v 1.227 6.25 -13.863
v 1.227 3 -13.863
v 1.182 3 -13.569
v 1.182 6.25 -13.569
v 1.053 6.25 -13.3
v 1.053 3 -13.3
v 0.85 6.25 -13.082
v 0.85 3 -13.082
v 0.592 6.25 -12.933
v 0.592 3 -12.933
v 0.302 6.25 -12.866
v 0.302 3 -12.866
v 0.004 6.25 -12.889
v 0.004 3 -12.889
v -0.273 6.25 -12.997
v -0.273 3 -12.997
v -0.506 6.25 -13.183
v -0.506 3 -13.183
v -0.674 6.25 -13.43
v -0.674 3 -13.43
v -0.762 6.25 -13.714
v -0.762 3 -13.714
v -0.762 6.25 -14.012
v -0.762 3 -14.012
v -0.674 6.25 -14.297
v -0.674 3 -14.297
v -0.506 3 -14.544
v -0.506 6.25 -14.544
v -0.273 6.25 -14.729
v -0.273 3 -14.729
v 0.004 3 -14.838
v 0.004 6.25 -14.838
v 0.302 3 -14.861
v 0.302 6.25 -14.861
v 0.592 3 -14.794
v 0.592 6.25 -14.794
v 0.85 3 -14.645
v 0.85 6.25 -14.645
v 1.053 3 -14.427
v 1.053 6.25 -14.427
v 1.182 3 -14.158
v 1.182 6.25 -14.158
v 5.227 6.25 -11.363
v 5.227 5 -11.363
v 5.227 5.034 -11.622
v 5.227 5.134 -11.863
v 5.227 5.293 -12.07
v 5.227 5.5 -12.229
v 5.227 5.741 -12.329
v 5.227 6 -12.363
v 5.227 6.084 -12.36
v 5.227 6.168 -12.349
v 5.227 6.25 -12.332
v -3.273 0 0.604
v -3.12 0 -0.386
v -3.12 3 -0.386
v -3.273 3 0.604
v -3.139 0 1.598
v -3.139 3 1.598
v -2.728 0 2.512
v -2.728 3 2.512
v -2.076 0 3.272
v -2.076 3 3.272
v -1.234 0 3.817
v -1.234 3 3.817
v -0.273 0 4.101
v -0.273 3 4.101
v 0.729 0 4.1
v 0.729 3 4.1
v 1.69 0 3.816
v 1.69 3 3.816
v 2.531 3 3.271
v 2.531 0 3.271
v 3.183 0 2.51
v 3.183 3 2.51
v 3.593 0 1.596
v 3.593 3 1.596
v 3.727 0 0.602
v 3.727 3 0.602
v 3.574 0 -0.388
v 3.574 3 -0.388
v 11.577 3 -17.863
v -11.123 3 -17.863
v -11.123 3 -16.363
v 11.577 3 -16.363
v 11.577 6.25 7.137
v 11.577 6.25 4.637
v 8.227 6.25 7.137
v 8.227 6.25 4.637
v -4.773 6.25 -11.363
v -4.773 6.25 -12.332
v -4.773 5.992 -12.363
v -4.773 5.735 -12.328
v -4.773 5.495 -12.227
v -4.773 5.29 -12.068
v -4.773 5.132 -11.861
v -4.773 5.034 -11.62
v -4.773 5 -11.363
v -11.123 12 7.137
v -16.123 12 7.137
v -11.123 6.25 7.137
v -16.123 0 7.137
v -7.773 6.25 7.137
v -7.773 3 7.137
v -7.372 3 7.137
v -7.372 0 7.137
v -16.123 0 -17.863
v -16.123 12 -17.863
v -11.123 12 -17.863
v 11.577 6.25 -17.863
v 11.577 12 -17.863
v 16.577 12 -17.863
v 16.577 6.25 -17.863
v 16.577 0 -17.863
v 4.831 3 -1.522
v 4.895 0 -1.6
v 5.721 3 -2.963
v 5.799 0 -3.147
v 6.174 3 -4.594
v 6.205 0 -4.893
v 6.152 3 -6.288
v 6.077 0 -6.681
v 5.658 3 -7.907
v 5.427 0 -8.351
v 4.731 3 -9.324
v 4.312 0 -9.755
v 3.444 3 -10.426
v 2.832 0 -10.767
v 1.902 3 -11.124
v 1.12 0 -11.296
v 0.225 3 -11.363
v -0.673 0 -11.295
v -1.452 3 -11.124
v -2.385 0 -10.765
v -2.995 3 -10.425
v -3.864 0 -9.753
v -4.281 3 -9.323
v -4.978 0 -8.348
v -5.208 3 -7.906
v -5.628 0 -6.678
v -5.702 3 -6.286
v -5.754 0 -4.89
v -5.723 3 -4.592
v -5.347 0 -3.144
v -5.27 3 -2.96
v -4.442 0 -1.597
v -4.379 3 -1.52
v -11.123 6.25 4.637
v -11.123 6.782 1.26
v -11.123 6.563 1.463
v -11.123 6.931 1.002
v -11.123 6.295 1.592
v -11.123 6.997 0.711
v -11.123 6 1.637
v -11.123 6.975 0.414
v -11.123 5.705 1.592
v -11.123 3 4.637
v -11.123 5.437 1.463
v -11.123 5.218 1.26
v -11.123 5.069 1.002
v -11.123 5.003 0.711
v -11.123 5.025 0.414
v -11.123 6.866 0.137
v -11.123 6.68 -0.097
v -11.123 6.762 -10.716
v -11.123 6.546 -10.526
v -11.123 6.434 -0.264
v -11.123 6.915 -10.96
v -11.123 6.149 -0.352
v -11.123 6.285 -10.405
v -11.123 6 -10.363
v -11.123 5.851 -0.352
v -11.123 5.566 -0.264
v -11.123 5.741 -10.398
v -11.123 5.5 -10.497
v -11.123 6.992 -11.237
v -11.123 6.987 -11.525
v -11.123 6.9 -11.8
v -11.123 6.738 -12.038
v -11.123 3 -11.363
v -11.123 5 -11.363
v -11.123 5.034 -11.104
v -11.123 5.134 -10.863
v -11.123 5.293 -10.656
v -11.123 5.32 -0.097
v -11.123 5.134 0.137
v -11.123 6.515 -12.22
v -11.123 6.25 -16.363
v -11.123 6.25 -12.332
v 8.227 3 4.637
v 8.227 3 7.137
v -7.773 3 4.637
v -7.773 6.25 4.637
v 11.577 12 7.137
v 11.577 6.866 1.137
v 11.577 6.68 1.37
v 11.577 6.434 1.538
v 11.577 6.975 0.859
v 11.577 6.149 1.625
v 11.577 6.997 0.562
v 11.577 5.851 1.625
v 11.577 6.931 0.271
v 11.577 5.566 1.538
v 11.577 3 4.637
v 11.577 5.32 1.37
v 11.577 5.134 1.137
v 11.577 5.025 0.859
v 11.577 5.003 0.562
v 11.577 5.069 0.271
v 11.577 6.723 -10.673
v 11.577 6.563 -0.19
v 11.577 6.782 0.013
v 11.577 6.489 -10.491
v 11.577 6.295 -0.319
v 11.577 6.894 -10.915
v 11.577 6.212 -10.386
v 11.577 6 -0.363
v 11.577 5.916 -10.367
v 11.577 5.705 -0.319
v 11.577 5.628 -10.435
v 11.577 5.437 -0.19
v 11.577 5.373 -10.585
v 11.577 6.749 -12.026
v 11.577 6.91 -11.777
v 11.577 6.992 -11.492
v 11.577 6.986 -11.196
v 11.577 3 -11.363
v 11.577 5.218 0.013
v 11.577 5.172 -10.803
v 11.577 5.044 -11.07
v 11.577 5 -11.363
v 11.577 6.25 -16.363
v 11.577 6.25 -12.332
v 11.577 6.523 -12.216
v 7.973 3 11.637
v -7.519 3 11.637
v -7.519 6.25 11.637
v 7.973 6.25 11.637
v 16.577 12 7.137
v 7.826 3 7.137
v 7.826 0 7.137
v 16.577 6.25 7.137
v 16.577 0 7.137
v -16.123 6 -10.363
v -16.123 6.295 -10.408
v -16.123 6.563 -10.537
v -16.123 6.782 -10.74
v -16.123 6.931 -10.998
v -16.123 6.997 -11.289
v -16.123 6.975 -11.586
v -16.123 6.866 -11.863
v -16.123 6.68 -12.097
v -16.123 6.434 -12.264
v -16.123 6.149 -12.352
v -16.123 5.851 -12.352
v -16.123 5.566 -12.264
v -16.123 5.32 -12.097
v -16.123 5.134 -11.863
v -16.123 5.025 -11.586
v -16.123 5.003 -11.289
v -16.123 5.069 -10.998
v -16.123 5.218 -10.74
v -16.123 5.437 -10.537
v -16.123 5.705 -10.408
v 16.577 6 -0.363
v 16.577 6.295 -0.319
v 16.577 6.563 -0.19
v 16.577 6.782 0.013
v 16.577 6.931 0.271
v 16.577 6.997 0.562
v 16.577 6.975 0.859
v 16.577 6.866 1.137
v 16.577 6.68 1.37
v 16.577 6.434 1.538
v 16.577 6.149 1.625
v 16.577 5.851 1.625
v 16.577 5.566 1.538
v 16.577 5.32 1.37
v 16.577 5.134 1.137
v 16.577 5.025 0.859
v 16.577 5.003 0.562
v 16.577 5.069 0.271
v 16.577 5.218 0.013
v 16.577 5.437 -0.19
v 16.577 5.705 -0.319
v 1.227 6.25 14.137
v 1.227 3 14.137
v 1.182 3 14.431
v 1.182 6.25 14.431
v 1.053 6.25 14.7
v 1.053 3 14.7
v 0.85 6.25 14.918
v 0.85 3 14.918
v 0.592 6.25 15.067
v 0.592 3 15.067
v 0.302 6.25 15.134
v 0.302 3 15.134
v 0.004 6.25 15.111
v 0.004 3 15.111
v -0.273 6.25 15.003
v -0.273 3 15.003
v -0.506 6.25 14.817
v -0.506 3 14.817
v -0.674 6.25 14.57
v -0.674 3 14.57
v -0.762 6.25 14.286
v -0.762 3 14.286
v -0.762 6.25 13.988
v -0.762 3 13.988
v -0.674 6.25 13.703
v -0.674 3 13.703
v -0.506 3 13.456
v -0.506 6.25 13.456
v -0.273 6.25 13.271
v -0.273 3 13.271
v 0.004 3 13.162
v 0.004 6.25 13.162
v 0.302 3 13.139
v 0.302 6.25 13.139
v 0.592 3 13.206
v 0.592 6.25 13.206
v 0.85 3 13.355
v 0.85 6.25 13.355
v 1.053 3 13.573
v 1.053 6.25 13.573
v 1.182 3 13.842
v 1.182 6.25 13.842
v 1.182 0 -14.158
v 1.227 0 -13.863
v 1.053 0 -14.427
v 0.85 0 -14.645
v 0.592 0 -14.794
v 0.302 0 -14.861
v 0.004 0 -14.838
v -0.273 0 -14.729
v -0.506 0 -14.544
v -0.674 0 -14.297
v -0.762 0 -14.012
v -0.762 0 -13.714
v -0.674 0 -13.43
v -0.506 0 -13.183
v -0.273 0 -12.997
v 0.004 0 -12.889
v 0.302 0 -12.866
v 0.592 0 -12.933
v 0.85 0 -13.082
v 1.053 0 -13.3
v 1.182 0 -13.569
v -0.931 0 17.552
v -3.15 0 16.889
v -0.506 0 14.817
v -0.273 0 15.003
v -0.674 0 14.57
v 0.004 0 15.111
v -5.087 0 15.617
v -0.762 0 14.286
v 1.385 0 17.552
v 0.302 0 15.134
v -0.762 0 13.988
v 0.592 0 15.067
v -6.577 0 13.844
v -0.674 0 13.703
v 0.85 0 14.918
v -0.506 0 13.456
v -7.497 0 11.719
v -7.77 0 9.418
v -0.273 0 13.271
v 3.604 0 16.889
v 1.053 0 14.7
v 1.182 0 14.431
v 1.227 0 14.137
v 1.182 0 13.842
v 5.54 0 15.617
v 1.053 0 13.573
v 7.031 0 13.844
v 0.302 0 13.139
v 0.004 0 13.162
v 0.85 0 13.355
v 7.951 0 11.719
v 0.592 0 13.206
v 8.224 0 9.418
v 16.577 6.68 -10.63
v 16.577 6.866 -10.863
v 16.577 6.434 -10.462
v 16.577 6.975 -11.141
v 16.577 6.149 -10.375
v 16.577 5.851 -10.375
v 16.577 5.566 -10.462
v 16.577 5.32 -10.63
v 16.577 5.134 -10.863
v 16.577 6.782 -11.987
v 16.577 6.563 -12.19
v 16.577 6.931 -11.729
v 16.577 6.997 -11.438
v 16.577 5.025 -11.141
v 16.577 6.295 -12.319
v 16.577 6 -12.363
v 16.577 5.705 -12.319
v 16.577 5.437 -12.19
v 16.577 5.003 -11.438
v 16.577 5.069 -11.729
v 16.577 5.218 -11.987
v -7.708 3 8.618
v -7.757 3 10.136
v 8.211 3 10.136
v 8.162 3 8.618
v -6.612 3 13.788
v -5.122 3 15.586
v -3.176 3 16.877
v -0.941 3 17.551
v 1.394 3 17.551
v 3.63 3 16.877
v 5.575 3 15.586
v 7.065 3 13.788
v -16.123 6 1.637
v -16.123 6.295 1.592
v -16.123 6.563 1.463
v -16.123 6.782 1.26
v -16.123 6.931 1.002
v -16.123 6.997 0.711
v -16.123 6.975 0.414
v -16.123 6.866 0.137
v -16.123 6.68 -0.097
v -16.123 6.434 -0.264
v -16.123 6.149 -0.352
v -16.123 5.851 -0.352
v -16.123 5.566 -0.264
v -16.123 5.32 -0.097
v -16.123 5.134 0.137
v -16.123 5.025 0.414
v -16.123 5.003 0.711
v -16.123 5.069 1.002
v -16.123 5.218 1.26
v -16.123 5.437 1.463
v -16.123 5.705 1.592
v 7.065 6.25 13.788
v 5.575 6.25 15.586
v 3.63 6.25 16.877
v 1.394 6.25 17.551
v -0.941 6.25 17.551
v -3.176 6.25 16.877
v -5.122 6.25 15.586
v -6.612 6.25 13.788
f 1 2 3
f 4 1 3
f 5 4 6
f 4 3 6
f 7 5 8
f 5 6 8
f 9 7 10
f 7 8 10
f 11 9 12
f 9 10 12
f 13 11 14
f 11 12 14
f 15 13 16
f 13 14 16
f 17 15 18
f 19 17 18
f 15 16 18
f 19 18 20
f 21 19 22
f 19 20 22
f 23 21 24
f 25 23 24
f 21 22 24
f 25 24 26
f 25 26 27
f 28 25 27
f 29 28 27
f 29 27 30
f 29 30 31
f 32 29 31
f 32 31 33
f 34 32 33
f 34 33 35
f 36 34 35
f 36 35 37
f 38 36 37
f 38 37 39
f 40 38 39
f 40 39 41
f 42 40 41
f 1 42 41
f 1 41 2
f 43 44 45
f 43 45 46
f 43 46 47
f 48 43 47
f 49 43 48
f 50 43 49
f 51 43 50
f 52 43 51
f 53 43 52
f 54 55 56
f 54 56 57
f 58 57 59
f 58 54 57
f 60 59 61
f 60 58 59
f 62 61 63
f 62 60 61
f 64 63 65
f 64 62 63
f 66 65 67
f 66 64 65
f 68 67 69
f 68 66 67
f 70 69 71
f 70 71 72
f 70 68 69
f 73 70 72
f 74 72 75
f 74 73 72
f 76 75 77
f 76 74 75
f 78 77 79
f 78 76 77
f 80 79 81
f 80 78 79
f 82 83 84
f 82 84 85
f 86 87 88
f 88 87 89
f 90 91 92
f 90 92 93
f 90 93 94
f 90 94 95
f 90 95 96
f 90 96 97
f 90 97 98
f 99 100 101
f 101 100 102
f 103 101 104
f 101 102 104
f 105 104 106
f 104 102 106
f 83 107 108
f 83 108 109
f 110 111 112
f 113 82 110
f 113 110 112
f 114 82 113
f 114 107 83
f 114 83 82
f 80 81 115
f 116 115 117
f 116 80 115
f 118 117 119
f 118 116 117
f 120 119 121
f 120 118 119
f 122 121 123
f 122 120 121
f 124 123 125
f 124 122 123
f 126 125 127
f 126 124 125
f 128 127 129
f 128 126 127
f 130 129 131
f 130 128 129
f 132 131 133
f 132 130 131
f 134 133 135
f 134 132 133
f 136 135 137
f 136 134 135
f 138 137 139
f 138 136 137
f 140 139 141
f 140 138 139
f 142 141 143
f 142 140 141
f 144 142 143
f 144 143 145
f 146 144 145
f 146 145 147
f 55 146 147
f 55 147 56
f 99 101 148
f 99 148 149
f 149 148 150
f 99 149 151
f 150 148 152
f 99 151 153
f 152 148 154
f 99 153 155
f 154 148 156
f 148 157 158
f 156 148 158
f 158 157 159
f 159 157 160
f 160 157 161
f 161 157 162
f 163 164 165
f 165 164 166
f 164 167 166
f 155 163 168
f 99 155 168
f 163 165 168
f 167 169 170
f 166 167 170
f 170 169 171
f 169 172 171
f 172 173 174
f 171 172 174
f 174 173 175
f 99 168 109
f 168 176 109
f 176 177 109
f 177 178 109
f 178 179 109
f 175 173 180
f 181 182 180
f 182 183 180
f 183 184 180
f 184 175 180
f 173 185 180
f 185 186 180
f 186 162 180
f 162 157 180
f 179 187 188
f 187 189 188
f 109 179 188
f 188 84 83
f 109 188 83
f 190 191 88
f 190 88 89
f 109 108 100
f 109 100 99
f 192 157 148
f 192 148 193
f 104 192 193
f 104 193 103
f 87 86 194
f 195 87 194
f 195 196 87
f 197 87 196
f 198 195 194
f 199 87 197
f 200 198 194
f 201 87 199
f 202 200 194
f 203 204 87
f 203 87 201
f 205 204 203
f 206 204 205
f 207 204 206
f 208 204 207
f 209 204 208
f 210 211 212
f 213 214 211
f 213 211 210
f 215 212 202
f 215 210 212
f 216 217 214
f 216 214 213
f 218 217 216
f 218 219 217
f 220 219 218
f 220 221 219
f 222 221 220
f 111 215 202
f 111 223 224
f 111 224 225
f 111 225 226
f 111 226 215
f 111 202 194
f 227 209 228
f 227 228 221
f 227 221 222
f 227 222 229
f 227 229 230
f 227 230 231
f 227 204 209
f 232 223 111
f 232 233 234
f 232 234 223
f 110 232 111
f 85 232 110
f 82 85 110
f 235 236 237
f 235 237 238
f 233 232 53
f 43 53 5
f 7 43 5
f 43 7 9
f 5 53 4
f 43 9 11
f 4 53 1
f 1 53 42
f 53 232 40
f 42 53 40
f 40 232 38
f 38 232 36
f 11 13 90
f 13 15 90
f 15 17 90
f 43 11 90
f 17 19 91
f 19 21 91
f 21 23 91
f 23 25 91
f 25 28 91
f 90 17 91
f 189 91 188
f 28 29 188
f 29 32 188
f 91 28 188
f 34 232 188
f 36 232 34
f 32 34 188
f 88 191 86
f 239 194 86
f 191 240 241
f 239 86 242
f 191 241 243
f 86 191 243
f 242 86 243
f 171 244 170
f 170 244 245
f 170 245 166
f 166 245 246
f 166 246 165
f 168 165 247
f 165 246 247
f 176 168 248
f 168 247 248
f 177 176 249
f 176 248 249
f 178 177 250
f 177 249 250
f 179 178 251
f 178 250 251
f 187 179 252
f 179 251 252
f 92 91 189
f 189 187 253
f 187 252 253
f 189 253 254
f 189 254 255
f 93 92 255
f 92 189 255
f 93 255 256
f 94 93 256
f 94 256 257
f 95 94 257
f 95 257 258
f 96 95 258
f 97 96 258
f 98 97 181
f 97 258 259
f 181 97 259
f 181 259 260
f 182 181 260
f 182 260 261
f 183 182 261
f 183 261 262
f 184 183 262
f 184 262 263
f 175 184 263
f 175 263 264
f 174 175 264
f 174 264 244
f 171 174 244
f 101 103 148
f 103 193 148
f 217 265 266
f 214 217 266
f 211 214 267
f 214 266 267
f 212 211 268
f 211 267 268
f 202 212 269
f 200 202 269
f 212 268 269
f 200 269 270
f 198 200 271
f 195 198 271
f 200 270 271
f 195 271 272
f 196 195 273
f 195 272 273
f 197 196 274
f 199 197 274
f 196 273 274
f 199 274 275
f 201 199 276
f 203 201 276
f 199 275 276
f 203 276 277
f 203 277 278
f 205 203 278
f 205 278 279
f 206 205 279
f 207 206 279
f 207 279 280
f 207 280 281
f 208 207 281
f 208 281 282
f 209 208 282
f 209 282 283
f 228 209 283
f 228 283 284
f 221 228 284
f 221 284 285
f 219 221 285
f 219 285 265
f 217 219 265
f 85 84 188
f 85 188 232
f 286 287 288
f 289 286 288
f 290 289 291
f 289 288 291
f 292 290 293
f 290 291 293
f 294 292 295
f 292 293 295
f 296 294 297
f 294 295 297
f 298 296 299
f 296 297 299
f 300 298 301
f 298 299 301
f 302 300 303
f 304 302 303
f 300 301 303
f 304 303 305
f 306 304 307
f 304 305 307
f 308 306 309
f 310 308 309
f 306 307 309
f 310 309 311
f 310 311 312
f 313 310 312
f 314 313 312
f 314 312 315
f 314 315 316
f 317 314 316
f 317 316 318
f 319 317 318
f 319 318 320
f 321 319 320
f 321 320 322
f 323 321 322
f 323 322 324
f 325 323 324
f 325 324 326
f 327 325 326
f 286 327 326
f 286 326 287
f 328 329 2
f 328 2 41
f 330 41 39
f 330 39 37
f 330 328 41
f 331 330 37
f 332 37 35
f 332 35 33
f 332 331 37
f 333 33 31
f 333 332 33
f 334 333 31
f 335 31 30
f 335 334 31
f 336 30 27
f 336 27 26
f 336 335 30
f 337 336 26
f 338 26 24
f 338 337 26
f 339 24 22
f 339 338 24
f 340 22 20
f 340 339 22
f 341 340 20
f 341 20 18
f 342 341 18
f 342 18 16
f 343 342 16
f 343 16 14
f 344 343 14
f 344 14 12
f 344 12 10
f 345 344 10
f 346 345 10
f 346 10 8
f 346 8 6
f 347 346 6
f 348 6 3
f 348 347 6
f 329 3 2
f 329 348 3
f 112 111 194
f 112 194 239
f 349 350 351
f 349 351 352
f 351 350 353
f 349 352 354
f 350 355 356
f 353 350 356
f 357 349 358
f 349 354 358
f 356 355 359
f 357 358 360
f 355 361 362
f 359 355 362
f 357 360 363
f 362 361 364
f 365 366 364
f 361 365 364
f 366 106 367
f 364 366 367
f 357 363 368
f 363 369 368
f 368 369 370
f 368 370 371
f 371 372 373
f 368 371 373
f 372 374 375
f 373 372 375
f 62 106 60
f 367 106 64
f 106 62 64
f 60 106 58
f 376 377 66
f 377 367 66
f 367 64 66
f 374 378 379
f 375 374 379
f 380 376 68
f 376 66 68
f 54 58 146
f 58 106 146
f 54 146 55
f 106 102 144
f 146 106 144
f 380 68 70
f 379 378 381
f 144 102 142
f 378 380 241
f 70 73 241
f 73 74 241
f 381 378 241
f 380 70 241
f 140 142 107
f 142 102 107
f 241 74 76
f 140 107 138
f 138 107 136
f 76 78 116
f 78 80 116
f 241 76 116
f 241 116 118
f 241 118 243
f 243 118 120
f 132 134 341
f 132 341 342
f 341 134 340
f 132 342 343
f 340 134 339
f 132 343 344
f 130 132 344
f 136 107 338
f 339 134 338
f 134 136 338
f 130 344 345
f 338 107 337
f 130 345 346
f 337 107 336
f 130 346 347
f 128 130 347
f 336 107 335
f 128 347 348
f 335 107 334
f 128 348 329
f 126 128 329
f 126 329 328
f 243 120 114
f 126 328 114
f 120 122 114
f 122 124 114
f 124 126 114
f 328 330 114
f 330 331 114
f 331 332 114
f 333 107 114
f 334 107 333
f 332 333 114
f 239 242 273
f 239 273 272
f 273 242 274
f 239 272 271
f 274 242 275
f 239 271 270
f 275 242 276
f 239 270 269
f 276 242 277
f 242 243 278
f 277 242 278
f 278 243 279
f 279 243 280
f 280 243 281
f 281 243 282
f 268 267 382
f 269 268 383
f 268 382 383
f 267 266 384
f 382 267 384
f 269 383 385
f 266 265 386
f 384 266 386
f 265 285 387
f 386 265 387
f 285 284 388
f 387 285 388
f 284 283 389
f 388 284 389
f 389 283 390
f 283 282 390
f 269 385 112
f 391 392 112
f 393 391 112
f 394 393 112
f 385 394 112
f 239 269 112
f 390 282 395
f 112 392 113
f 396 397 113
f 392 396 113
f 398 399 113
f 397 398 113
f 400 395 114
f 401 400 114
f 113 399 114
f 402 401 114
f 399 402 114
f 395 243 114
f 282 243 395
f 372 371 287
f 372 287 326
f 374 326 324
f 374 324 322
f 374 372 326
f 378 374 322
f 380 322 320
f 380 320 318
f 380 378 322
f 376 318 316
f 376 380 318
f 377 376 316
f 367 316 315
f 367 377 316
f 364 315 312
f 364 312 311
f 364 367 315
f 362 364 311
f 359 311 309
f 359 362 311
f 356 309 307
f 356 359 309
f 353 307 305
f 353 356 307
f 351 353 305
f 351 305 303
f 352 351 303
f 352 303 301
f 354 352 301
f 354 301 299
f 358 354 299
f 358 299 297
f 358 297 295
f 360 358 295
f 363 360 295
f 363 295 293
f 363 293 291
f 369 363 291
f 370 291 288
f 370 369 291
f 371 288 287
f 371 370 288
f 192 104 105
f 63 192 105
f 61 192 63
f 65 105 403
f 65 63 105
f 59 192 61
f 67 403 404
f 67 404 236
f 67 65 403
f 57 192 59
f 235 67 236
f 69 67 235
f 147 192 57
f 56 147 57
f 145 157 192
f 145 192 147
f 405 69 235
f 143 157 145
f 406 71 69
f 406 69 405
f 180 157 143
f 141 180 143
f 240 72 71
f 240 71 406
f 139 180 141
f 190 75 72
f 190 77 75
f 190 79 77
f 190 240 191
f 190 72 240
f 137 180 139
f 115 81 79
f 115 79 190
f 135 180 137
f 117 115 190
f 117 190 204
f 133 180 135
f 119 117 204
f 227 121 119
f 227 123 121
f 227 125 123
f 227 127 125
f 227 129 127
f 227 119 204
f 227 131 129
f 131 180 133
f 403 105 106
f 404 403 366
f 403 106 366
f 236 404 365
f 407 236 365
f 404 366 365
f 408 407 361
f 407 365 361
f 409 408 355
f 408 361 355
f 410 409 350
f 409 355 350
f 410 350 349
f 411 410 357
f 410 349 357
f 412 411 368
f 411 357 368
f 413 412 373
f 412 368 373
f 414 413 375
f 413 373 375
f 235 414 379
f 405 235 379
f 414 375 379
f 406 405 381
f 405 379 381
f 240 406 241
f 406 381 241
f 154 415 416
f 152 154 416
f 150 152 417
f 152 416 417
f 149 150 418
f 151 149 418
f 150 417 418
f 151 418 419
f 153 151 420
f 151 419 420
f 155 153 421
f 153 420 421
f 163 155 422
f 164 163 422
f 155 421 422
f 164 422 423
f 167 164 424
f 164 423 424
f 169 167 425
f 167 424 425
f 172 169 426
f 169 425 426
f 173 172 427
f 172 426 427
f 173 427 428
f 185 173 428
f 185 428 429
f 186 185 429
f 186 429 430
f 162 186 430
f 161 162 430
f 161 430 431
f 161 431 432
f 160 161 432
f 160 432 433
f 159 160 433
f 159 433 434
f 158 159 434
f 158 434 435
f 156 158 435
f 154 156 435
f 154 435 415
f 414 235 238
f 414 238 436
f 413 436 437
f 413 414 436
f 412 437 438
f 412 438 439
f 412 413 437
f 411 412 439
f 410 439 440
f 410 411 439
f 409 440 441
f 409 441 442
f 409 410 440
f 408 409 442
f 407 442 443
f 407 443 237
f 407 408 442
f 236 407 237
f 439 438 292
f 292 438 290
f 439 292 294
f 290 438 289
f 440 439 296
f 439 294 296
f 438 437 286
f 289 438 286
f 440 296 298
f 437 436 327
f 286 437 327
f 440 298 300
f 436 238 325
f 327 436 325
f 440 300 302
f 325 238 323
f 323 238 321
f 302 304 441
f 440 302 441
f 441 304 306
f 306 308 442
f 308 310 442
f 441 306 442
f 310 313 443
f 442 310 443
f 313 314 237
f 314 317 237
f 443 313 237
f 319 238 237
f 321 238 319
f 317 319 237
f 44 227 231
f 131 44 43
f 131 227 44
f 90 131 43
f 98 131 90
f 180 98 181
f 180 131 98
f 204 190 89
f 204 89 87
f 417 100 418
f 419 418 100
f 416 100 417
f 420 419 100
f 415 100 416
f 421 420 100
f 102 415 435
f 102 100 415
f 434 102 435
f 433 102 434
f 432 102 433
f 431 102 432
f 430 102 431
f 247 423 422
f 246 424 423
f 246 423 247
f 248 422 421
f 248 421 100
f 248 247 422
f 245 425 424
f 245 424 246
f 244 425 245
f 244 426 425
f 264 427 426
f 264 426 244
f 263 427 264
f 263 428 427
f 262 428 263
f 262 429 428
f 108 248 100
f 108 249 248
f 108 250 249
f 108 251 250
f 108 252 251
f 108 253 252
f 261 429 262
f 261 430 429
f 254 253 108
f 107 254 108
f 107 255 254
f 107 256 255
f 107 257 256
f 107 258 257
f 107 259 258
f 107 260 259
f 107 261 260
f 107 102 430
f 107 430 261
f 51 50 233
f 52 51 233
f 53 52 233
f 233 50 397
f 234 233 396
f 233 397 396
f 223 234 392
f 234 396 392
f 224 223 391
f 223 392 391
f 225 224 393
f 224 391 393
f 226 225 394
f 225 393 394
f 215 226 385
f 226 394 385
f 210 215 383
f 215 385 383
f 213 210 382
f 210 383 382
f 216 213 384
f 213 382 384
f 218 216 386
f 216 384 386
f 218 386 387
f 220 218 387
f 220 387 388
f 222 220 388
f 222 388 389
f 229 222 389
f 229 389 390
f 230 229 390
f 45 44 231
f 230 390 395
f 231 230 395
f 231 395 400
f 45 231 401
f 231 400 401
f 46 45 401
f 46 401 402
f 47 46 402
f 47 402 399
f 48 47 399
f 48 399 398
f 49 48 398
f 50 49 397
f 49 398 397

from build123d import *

# Parameters (mm, degrees)
CROQUIS1_R              = 1.000000138
CROQUIS1_R_2            = 0.999999989
SALIENTE_EXTRUIR1_DEPTH = 3
SALIENTE_EXTRUIR2_DEPTH = 3.25
CROQUIS3_W              = 5.000000382
CROQUIS3_H              = 25
CROQUIS3_W_2            = 5.000000381
SALIENTE_EXTRUIR3_DEPTH = 5.75
CROQUIS4_R              = 1
CORTAR_EXTRUIR1_DEPTH   = 11.35
CROQUIS5_R              = 1
CORTAR_EXTRUIR2_DEPTH   = 11.35
CROQUIS6_R              = 1.000000138
CROQUIS6_R_2            = 0.999999989
CORTAR_EXTRUIR3_DEPTH   = 11.35


with BuildPart() as part:
    # Croquis1 → Saliente-Extruir1 (new body)
    with BuildSketch(Plane(origin=(0, 0, 0), x_dir=(1, 0, 0), z_dir=(0, 1, 0))):
        with BuildLine():
            Line((7.826252673, -7.136543799), (16.57691182, -7.136543799))
            Line((16.57691182, -7.136543799), (16.57691182, 17.863456201))
            Line((16.57691182, 17.863456201), (-16.123088943, 17.863456201))
            Line((-16.123088943, 17.863456201), (-16.123088943, -7.136543799))
            Line((-16.123088943, -7.136543799), (-7.372430407, -7.136543799))
            ThreePointArc((-7.372430407, -7.136543799), (0.226911133, -17.636544763), (7.826252673, -7.136543799))
        make_face()
        with Locations((0.226911587, 13.863456348)):
            Circle(CROQUIS1_R, mode=Mode.SUBTRACT)
        with Locations((0.226910898, -14.136544906)):
            Circle(CROQUIS1_R_2, mode=Mode.SUBTRACT)
        with BuildLine():
            ThreePointArc((-3.120375102, 0.386039479), (0.227925042, -4.136543652), (3.573605207, 0.387978009))
            ThreePointArc((3.573605207, 0.387978009), (0.223436552, 11.362755325), (-3.120375102, 0.386039479))
        make_face(mode=Mode.SUBTRACT)
    extrude(amount=SALIENTE_EXTRUIR1_DEPTH)

    # Croquis2 → Saliente-Extruir2 (add)
    with BuildSketch(Plane(origin=(0, 3, 0), x_dir=(1, 0, 0), z_dir=(0, 1, 0))):
        with BuildLine():
            Line((-7.519055395, -11.636544922), (7.972877662, -11.636544922))
            ThreePointArc((7.972877662, -11.636544922), (0.226911133, -17.636544763), (-7.519055395, -11.636544922))
        make_face()
        Polygon((-16.123088943, 17.863456201), (-11.123088561, 17.863456201), (-11.123088561, 16.363456201), (11.576911439, 16.363456201), (11.576911439, 17.863456201), (16.57691182, 17.863456201), (16.57691182, -7.136543799), (8.226911439, -7.136543799), (8.226911439, -4.636543799), (11.576911439, -4.636543799), (11.576911439, 11.362755577), (-11.123088561, 11.362755577), (-11.123088561, -4.636543799), (-7.773088561, -4.636543799), (-7.773088561, -7.136543799), (-16.123088943, -7.136543799), align=None)
    extrude(amount=SALIENTE_EXTRUIR2_DEPTH)

    # Croquis3 → Saliente-Extruir3 (add)
    with BuildSketch(Plane(origin=(0, 6.25, 0), x_dir=(1, 0, 0), z_dir=(0, 1, 0))):
        with Locations((-13.623088752, 5.363456201)):
            Rectangle(CROQUIS3_W, CROQUIS3_H)
        with Locations((14.076911629, 5.363456201)):
            Rectangle(CROQUIS3_W_2, CROQUIS3_H)
    extrude(amount=SALIENTE_EXTRUIR3_DEPTH)

    # Croquis4 → Cortar-Extruir1 (cut)
    with BuildSketch(Plane.ZY.offset(16.123088943)):
        with Locations((-11.363456201, 6)):
            Circle(CROQUIS4_R)
        with Locations((0.636543799, 6)):
            Circle(CROQUIS4_R)
    extrude(amount=-CORTAR_EXTRUIR1_DEPTH, mode=Mode.SUBTRACT)

    # Croquis5 → Cortar-Extruir2 (cut)
    with BuildSketch(Plane(origin=(16.57691182, 0, 0), x_dir=(0, 0, -1), z_dir=(1, 0, 0))):
        with Locations((11.363456201, 6)):
            Circle(CROQUIS5_R)
        with Locations((-0.636543799, 6)):
            Circle(CROQUIS5_R)
    extrude(amount=-CORTAR_EXTRUIR2_DEPTH, mode=Mode.SUBTRACT)

    # Croquis6 → Cortar-Extruir3 (cut)
    with BuildSketch(Plane.XZ):
        with Locations((0.226911587, -13.863456348)):
            Circle(CROQUIS6_R)
        with Locations((0.226910898, 14.136544906)):
            Circle(CROQUIS6_R_2)
    extrude(amount=-CORTAR_EXTRUIR3_DEPTH, mode=Mode.SUBTRACT)


solid = part.part
